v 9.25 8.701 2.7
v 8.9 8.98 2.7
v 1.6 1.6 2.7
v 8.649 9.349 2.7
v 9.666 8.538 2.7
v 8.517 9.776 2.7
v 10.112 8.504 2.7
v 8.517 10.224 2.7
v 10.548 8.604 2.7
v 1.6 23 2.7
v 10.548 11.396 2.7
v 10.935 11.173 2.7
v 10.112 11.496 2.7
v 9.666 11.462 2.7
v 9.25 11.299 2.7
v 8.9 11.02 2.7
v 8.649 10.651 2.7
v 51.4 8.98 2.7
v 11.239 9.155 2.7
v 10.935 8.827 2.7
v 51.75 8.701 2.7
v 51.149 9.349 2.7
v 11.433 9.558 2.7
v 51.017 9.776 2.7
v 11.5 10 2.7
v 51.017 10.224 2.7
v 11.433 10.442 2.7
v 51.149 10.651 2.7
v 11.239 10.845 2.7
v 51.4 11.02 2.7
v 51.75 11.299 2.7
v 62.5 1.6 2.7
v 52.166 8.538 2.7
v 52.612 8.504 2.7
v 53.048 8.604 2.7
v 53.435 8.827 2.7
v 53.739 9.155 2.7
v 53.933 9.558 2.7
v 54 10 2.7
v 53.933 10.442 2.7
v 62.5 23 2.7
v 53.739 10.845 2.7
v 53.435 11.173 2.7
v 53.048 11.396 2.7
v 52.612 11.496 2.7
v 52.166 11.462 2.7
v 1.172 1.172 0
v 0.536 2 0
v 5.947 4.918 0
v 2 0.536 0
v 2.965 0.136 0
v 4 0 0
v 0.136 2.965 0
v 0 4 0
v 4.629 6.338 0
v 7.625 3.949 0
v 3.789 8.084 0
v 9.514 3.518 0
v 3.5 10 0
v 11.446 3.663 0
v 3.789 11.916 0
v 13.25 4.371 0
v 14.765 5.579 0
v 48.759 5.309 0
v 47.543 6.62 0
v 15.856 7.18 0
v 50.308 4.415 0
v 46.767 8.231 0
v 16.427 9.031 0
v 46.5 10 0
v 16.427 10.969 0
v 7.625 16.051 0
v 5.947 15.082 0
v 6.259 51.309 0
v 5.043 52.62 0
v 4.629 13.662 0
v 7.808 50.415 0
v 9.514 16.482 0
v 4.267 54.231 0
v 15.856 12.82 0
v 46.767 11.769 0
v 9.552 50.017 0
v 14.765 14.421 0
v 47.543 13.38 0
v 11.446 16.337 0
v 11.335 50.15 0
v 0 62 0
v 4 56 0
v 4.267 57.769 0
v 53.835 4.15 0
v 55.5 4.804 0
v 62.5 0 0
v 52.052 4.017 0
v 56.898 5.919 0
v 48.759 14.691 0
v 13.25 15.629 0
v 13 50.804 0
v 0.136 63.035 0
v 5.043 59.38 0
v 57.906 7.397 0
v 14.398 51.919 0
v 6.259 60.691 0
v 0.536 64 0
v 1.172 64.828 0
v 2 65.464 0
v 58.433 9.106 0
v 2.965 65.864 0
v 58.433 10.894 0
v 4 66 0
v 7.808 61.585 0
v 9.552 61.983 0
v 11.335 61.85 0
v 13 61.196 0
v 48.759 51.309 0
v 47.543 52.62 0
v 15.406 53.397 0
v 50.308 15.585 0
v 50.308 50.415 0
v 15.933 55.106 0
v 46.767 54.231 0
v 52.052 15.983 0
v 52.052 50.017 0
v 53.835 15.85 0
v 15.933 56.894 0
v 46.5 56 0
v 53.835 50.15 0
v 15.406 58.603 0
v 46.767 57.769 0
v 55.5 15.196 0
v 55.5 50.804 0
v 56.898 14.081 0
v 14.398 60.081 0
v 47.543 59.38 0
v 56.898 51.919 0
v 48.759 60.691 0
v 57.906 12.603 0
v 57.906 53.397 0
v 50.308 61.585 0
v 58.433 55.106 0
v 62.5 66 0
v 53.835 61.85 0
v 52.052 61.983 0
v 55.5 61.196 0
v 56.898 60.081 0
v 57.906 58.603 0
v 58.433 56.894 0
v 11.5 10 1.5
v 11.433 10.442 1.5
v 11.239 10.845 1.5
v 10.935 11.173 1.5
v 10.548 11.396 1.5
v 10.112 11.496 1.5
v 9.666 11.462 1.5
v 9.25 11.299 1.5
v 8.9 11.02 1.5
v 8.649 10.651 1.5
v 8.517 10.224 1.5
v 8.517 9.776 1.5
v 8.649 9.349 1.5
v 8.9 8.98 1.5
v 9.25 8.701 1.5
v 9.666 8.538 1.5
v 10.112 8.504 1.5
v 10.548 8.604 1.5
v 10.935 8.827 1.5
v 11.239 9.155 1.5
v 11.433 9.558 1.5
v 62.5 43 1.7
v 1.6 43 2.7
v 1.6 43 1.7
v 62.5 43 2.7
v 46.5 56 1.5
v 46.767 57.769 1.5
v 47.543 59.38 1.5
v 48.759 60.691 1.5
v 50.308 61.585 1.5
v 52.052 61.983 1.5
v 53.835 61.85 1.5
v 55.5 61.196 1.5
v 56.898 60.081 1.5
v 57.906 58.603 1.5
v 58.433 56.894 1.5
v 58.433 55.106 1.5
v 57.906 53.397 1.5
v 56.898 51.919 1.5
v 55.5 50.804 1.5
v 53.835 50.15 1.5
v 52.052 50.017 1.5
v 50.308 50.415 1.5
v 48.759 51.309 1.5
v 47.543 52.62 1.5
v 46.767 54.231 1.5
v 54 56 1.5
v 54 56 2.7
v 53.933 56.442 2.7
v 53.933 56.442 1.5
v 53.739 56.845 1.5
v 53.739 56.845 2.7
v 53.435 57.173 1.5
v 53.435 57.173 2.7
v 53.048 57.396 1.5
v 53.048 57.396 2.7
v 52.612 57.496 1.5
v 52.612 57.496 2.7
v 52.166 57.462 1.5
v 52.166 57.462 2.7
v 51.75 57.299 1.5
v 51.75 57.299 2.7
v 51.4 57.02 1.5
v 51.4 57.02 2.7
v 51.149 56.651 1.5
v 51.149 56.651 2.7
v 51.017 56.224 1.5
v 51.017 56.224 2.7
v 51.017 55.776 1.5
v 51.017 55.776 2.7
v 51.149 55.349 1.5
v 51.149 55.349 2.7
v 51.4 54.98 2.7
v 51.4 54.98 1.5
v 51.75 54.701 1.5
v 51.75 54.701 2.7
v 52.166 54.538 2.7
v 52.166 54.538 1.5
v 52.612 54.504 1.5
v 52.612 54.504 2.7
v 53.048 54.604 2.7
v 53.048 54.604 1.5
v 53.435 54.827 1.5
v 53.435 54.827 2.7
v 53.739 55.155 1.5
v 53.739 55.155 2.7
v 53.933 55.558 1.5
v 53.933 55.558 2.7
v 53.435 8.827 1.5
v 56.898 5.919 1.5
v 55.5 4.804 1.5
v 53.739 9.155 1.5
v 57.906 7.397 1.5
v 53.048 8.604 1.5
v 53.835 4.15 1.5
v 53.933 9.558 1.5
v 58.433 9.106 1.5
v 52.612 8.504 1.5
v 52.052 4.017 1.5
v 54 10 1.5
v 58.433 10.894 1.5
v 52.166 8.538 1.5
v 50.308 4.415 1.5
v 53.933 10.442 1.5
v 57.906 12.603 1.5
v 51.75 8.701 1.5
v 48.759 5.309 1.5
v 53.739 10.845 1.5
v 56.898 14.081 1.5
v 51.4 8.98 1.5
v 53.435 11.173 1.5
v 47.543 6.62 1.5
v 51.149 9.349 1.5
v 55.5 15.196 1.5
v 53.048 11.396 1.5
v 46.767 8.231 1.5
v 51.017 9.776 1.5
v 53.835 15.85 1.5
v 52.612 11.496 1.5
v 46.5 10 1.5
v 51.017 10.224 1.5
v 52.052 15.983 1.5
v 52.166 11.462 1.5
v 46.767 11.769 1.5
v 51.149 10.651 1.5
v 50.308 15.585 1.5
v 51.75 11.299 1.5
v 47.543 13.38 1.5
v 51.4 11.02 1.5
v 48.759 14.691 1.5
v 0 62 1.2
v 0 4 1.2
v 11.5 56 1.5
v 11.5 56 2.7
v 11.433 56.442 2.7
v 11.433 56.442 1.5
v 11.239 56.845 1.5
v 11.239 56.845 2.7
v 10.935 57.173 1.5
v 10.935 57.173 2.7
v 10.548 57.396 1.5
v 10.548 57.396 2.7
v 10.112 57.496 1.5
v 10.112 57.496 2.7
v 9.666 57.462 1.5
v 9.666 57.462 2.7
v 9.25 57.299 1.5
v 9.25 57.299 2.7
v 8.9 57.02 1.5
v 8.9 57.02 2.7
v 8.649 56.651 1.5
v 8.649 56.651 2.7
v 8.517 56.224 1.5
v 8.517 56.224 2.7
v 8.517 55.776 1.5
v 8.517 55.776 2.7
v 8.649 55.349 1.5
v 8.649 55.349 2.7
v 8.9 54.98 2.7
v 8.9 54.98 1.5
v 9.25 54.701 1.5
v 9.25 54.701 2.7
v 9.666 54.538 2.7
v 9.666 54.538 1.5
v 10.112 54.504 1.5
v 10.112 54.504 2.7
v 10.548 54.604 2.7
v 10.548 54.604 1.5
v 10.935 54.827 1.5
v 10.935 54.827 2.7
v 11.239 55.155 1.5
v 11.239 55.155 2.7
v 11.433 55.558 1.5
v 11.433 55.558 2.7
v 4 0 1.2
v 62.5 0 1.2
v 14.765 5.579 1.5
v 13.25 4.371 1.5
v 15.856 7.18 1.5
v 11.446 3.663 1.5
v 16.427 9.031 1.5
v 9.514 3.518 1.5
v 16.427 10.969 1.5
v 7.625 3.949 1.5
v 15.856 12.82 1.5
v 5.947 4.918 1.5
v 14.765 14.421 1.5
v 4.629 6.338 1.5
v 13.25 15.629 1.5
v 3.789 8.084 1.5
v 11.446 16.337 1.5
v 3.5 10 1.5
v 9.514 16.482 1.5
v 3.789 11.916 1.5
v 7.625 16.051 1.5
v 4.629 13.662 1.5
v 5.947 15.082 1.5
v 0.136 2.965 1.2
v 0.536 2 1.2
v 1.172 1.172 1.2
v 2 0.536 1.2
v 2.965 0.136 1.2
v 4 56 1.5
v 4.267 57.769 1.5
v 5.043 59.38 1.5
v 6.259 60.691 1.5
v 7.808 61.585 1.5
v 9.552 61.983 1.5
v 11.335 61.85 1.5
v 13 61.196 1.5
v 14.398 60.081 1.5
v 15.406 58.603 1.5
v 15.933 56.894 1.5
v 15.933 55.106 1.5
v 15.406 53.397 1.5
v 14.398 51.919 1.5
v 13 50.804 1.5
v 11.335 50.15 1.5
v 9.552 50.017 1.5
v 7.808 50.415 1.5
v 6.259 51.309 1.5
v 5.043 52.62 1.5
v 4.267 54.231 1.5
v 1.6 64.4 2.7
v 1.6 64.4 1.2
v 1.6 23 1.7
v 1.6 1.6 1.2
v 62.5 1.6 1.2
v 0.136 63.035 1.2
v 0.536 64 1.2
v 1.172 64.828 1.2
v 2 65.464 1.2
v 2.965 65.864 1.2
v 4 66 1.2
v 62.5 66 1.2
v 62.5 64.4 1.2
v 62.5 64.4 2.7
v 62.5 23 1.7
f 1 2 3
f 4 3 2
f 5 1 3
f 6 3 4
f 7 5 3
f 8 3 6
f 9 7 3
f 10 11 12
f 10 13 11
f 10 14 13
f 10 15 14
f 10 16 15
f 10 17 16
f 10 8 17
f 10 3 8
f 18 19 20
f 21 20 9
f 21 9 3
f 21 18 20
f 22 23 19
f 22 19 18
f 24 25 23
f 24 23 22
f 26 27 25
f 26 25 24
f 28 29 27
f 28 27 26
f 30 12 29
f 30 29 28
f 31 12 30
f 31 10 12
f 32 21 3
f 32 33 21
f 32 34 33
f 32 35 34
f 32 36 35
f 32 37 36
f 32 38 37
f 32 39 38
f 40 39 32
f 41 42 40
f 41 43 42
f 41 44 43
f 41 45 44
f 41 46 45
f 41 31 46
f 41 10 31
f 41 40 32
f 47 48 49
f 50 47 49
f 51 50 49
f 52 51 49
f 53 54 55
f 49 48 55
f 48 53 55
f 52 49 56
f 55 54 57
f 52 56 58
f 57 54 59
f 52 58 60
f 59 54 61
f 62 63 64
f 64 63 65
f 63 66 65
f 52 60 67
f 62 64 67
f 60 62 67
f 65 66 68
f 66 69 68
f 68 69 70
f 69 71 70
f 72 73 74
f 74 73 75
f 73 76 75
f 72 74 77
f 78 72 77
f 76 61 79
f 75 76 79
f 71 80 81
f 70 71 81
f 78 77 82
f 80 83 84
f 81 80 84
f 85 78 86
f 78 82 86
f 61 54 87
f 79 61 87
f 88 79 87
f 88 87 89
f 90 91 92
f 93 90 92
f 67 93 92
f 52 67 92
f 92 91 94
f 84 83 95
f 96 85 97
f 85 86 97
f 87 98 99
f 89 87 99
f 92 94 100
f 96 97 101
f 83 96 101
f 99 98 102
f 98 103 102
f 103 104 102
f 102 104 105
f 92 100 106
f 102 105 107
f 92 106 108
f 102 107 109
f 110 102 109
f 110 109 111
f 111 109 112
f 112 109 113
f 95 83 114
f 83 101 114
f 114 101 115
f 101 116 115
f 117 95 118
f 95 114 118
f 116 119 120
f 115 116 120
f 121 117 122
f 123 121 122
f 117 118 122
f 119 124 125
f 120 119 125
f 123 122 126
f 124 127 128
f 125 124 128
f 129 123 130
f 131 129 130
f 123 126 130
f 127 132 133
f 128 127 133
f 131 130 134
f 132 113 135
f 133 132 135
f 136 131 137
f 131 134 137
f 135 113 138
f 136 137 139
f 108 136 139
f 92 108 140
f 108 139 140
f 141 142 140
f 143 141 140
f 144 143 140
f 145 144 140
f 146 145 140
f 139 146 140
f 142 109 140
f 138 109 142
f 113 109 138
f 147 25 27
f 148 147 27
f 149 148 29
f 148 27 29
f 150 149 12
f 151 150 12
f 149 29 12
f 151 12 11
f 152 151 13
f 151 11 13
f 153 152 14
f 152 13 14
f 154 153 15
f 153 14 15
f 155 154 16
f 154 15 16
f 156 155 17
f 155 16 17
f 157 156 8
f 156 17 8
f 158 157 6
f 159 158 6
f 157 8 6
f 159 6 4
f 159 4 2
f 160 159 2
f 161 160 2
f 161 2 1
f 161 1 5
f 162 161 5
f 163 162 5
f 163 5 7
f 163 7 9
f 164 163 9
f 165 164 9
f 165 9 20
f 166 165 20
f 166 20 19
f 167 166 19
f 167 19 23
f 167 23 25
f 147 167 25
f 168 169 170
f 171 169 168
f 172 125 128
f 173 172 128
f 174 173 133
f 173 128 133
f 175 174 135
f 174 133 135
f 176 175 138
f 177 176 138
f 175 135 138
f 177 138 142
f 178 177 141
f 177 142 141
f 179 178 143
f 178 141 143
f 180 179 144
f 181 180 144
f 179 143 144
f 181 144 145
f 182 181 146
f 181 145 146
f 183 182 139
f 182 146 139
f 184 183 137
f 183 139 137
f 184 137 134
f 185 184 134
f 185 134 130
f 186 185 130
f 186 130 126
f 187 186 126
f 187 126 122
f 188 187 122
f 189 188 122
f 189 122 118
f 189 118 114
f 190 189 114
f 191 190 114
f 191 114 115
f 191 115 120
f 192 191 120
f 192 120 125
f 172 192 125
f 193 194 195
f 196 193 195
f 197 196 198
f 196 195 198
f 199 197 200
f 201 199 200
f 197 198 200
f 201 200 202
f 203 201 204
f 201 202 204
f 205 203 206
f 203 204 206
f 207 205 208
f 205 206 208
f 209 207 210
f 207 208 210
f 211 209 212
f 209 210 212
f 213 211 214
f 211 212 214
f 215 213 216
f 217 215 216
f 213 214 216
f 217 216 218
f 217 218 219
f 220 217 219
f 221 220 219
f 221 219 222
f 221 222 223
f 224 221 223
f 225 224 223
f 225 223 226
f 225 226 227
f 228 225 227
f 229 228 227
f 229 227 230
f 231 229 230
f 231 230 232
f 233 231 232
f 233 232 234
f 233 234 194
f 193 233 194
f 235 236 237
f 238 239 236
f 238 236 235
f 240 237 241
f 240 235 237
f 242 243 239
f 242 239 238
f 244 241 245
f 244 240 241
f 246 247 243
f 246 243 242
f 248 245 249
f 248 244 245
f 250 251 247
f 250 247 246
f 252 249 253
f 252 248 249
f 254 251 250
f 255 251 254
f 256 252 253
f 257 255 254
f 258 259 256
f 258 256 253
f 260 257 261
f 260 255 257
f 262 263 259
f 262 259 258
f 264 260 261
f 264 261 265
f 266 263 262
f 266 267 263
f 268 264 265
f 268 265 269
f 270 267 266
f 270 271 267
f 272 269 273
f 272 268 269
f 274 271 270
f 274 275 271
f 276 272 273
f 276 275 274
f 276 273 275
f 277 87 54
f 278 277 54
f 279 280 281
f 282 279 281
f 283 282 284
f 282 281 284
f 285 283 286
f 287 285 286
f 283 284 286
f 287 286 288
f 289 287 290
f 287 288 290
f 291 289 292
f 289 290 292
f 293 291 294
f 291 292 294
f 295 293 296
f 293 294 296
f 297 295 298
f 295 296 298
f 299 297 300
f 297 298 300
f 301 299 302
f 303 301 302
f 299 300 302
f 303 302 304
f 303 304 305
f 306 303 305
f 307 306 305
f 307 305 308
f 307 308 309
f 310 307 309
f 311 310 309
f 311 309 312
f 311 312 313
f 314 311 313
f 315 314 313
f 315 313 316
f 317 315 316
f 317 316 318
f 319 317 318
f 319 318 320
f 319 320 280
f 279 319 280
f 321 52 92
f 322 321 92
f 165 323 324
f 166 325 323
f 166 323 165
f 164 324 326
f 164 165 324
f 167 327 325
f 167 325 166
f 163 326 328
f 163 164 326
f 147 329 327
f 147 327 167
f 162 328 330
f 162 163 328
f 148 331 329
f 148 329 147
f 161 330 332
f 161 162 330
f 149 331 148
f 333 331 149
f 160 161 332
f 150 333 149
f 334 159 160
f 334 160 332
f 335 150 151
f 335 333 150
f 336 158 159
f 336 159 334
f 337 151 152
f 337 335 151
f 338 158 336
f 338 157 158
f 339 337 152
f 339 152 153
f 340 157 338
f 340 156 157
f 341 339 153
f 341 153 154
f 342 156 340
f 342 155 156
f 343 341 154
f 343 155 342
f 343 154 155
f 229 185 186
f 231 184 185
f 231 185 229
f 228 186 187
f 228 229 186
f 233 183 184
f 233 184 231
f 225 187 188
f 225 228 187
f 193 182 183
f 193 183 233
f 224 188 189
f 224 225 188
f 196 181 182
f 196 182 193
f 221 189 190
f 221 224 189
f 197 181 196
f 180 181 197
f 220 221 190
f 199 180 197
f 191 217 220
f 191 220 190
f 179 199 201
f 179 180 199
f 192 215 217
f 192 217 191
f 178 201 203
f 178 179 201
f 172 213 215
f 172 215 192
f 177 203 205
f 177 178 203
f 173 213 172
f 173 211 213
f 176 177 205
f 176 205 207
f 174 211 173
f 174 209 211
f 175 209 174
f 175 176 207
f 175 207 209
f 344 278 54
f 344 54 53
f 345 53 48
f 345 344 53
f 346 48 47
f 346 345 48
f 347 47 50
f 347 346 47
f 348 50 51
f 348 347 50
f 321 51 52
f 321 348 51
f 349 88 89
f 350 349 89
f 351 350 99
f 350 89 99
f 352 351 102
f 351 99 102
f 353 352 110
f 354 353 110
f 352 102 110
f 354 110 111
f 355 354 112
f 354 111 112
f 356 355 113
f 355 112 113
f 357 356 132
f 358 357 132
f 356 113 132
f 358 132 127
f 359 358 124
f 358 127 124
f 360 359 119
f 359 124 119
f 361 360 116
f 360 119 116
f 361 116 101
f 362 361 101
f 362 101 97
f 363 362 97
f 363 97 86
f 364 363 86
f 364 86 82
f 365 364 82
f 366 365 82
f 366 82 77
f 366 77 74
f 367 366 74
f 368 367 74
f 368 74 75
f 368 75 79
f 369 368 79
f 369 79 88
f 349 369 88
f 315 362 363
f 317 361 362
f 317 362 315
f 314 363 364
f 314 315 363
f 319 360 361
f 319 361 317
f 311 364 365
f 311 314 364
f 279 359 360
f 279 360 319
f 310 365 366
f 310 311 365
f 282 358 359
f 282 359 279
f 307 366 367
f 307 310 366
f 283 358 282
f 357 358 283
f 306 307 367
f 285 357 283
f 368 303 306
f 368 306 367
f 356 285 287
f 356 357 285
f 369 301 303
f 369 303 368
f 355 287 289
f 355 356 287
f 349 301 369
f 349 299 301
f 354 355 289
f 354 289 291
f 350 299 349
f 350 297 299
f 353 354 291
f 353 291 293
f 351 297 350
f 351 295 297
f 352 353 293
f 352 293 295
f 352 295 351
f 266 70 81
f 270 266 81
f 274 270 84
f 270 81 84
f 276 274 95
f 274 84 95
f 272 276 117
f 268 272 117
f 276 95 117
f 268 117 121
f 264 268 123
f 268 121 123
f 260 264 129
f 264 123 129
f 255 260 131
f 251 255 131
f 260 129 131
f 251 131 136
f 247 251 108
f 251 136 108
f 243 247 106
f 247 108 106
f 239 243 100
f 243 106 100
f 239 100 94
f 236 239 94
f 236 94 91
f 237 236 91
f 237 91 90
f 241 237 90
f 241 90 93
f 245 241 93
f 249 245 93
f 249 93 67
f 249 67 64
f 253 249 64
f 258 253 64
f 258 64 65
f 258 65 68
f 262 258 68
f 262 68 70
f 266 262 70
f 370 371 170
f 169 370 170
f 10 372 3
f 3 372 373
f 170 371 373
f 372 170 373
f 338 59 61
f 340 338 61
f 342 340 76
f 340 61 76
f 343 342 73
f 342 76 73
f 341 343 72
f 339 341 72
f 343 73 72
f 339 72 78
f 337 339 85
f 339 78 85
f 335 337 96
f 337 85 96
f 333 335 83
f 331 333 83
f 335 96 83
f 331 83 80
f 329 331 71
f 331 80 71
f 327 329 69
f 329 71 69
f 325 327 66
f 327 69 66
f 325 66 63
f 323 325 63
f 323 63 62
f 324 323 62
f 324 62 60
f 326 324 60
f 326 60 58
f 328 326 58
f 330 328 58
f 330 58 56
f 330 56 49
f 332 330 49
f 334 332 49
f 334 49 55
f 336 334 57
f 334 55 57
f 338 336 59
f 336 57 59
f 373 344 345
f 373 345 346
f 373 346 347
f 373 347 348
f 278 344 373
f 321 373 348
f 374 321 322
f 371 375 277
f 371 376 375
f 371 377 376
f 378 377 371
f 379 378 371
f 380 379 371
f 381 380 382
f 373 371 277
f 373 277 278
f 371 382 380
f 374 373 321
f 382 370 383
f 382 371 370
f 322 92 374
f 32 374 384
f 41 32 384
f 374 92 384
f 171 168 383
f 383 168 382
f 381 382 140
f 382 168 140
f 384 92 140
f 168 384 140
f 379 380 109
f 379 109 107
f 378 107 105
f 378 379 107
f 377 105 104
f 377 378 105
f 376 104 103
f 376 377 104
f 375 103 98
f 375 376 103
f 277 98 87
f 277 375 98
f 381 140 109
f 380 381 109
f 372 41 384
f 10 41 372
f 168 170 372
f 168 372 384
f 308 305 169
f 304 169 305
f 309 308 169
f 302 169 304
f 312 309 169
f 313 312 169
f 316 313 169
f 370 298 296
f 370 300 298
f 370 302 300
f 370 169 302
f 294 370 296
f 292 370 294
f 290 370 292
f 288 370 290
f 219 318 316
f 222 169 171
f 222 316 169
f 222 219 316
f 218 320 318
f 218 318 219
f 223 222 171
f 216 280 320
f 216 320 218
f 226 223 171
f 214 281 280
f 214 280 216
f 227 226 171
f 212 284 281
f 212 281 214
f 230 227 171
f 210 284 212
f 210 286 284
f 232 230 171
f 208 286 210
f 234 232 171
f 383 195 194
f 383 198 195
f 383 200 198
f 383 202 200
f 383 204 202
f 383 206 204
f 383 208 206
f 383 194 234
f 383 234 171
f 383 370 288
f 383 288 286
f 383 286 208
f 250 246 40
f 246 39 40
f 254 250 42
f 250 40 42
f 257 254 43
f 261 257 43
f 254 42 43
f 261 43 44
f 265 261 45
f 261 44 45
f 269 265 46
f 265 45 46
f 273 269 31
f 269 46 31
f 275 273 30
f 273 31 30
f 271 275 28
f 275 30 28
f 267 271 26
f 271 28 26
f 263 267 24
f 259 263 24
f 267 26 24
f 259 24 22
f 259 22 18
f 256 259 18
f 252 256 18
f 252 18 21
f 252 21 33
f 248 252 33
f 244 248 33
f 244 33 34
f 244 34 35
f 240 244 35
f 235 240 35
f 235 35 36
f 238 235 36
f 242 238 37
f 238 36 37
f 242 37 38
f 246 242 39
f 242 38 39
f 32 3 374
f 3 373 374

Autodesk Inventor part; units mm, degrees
ref_plane "YZ Plane" through (0, 0, 0) normal (1, 0, 0) x (0, 1, 0)
ref_plane "XZ Plane" through (0, 0, 0) normal (0, 1, 0) x (-1, 0, 0)
ref_plane "XY Plane" through (0, 0, 0) normal (0, 0, 1) x (1, 0, 0)
sketch "Sketch1" plane through (0, 0, 0) normal (0, 0, 1) x (1, 0, 0)
  line L0 (0, 0) -> (62.5, 0)
  line L1 (62.5, 0) -> (62.5, 66)
  line L2 (62.5, 66) -> (0, 66)
  line L3 (0, 66) -> (0, 0)
  dimension "d0" = 62.5
  dimension "d1" = 66
extrude "Extrusion1" add sketch "Sketch1" along normal blind 1.2
sketch "Sketch2" plane through (0, 0, 1.2) normal (0, 0, 1) x (1, 0, 0)
  line L0 (62.5, 66) -> (0, 66) projected
  line L1 (0, 66) -> (0, 0) projected
  line L2 (62.5, 66) -> (0, 66)
  line L3 (0, 66) -> (0, 64.4)
  line L4 (0, 64.4) -> (62.5, 64.4)
  line L5 (62.5, 64.4) -> (62.5, 66)
  line L6 (62.5, 0) -> (62.5, 66) projected
  line L7 (62.5, 0) -> (0, 0)
  line L8 (0, 0) -> (0, 1.6)
  line L9 (0, 1.6) -> (62.5, 1.6)
  line L10 (62.5, 1.6) -> (62.5, 0)
  line L11 (0, 0) -> (62.5, 0) projected
  line L12 (0, 66) -> (1.6, 66)
  line L13 (1.6, 66) -> (1.6, 0)
  line L14 (1.6, 0) -> (0, 0)
  line L15 (0, 0) -> (0, 66)
  line L16 (62.5, 64.4) -> (1.6, 64.4)
  line L17 (1.6, 64.4) -> (1.6, 1.6)
  line L18 (1.6, 1.6) -> (62.5, 1.6)
  line L19 (62.5, 1.6) -> (62.5, 64.4)
  dimension "d4" = 1.6
  dimension "d5" = 1.6
  dimension "d6" = 1.6
extrude "Extrusion2" add sketch "Sketch2" along normal blind 1.5 contours L6 L9 L13 L4
sketch "Sketch3" plane through (0, 0, 2.7) normal (0, 0, 1) x (1, 0, 0)
  line L0 (1.6, 1.6) -> (1.6, 64.4) projected
  line L1 (1.6, 1.6) -> (1.6, 64.4)
  line L2 (1.6, 33) -> (1.6, 43)
  line L3 (1.6, 43) -> (64.8797, 43)
  line L4 (64.8797, 43) -> (64.8797, 23)
  line L5 (64.8797, 23) -> (1.6, 23)
  line L6 (1.6, 23) -> (1.6, 43)
  point P0 (0, 0)
  point P1 (1.6, 23)
  dimension "d9" = 10
  dimension "d10" = 20
extrude "Extrusion3" cut sketch "Sketch3" against normal blind 1
sketch "Sketch4" plane through (0, 0, 2.7) normal (0, 0, 1) x (1, 0, 0)
  line L0 (62.5, 64.4) -> (1.6, 64.4) projected
  line L1 (62.5, 1.6) -> (1.6, 1.6) projected
  line L2 (1.6, 64.4) -> (60.9, 64.4)
  line L3 (60.9, 64.4) -> (60.9, 1.6)
  line L4 (60.9, 1.6) -> (1.6, 1.6)
  line L5 (1.6, 1.6) -> (1.6, 64.4)
  line L6 (0, 66) -> (0, 0) projected
  circle A0 centre (10, 56) radius 1.5
  line L7 (62.5, 0) -> (62.5, 66) projected
  circle A1 centre (52.5, 56) radius 1.5
  circle A2 centre (10, 10) radius 1.5
  circle A3 centre (52.5, 10) radius 1.5
  dimension "d13" = 59.3
extrude "Extrusion4" cut sketch "Sketch4" against normal through all contours A0 | A1 | A2 | A3
sketch "Sketch5" plane through (0, 0, 0) normal (0, 0, -1) x (-1, 0, 0)
  circle A0 centre (-52.5, 56) radius 1.5 projected
  circle A1 centre (-52.5, 56) radius 6
  circle A2 centre (-10, 56) radius 1.5 projected
  circle A3 centre (-10, 56) radius 6
  circle A4 centre (-52.5, 10) radius 1.5 projected
  circle A5 centre (-52.5, 10) radius 6
  circle A6 centre (-10, 10) radius 1.5 projected
  circle A7 centre (-10, 10) radius 6.5
  point P0 (0, 0)
  dimension "d22" = 12
  dimension "d23" = 12
  dimension "d24" = 12
  dimension "d25" = 13
extrude "Extrusion5" cut sketch "Sketch5" against normal blind 1.5 contours A0 | A1 | A3 | A4 | A5 | A7
fillet "Fillet1" radius 4 2 edges at (0, 66, 0.6) (0, 0, 0.6)
properties part number "SlaveLåg"
